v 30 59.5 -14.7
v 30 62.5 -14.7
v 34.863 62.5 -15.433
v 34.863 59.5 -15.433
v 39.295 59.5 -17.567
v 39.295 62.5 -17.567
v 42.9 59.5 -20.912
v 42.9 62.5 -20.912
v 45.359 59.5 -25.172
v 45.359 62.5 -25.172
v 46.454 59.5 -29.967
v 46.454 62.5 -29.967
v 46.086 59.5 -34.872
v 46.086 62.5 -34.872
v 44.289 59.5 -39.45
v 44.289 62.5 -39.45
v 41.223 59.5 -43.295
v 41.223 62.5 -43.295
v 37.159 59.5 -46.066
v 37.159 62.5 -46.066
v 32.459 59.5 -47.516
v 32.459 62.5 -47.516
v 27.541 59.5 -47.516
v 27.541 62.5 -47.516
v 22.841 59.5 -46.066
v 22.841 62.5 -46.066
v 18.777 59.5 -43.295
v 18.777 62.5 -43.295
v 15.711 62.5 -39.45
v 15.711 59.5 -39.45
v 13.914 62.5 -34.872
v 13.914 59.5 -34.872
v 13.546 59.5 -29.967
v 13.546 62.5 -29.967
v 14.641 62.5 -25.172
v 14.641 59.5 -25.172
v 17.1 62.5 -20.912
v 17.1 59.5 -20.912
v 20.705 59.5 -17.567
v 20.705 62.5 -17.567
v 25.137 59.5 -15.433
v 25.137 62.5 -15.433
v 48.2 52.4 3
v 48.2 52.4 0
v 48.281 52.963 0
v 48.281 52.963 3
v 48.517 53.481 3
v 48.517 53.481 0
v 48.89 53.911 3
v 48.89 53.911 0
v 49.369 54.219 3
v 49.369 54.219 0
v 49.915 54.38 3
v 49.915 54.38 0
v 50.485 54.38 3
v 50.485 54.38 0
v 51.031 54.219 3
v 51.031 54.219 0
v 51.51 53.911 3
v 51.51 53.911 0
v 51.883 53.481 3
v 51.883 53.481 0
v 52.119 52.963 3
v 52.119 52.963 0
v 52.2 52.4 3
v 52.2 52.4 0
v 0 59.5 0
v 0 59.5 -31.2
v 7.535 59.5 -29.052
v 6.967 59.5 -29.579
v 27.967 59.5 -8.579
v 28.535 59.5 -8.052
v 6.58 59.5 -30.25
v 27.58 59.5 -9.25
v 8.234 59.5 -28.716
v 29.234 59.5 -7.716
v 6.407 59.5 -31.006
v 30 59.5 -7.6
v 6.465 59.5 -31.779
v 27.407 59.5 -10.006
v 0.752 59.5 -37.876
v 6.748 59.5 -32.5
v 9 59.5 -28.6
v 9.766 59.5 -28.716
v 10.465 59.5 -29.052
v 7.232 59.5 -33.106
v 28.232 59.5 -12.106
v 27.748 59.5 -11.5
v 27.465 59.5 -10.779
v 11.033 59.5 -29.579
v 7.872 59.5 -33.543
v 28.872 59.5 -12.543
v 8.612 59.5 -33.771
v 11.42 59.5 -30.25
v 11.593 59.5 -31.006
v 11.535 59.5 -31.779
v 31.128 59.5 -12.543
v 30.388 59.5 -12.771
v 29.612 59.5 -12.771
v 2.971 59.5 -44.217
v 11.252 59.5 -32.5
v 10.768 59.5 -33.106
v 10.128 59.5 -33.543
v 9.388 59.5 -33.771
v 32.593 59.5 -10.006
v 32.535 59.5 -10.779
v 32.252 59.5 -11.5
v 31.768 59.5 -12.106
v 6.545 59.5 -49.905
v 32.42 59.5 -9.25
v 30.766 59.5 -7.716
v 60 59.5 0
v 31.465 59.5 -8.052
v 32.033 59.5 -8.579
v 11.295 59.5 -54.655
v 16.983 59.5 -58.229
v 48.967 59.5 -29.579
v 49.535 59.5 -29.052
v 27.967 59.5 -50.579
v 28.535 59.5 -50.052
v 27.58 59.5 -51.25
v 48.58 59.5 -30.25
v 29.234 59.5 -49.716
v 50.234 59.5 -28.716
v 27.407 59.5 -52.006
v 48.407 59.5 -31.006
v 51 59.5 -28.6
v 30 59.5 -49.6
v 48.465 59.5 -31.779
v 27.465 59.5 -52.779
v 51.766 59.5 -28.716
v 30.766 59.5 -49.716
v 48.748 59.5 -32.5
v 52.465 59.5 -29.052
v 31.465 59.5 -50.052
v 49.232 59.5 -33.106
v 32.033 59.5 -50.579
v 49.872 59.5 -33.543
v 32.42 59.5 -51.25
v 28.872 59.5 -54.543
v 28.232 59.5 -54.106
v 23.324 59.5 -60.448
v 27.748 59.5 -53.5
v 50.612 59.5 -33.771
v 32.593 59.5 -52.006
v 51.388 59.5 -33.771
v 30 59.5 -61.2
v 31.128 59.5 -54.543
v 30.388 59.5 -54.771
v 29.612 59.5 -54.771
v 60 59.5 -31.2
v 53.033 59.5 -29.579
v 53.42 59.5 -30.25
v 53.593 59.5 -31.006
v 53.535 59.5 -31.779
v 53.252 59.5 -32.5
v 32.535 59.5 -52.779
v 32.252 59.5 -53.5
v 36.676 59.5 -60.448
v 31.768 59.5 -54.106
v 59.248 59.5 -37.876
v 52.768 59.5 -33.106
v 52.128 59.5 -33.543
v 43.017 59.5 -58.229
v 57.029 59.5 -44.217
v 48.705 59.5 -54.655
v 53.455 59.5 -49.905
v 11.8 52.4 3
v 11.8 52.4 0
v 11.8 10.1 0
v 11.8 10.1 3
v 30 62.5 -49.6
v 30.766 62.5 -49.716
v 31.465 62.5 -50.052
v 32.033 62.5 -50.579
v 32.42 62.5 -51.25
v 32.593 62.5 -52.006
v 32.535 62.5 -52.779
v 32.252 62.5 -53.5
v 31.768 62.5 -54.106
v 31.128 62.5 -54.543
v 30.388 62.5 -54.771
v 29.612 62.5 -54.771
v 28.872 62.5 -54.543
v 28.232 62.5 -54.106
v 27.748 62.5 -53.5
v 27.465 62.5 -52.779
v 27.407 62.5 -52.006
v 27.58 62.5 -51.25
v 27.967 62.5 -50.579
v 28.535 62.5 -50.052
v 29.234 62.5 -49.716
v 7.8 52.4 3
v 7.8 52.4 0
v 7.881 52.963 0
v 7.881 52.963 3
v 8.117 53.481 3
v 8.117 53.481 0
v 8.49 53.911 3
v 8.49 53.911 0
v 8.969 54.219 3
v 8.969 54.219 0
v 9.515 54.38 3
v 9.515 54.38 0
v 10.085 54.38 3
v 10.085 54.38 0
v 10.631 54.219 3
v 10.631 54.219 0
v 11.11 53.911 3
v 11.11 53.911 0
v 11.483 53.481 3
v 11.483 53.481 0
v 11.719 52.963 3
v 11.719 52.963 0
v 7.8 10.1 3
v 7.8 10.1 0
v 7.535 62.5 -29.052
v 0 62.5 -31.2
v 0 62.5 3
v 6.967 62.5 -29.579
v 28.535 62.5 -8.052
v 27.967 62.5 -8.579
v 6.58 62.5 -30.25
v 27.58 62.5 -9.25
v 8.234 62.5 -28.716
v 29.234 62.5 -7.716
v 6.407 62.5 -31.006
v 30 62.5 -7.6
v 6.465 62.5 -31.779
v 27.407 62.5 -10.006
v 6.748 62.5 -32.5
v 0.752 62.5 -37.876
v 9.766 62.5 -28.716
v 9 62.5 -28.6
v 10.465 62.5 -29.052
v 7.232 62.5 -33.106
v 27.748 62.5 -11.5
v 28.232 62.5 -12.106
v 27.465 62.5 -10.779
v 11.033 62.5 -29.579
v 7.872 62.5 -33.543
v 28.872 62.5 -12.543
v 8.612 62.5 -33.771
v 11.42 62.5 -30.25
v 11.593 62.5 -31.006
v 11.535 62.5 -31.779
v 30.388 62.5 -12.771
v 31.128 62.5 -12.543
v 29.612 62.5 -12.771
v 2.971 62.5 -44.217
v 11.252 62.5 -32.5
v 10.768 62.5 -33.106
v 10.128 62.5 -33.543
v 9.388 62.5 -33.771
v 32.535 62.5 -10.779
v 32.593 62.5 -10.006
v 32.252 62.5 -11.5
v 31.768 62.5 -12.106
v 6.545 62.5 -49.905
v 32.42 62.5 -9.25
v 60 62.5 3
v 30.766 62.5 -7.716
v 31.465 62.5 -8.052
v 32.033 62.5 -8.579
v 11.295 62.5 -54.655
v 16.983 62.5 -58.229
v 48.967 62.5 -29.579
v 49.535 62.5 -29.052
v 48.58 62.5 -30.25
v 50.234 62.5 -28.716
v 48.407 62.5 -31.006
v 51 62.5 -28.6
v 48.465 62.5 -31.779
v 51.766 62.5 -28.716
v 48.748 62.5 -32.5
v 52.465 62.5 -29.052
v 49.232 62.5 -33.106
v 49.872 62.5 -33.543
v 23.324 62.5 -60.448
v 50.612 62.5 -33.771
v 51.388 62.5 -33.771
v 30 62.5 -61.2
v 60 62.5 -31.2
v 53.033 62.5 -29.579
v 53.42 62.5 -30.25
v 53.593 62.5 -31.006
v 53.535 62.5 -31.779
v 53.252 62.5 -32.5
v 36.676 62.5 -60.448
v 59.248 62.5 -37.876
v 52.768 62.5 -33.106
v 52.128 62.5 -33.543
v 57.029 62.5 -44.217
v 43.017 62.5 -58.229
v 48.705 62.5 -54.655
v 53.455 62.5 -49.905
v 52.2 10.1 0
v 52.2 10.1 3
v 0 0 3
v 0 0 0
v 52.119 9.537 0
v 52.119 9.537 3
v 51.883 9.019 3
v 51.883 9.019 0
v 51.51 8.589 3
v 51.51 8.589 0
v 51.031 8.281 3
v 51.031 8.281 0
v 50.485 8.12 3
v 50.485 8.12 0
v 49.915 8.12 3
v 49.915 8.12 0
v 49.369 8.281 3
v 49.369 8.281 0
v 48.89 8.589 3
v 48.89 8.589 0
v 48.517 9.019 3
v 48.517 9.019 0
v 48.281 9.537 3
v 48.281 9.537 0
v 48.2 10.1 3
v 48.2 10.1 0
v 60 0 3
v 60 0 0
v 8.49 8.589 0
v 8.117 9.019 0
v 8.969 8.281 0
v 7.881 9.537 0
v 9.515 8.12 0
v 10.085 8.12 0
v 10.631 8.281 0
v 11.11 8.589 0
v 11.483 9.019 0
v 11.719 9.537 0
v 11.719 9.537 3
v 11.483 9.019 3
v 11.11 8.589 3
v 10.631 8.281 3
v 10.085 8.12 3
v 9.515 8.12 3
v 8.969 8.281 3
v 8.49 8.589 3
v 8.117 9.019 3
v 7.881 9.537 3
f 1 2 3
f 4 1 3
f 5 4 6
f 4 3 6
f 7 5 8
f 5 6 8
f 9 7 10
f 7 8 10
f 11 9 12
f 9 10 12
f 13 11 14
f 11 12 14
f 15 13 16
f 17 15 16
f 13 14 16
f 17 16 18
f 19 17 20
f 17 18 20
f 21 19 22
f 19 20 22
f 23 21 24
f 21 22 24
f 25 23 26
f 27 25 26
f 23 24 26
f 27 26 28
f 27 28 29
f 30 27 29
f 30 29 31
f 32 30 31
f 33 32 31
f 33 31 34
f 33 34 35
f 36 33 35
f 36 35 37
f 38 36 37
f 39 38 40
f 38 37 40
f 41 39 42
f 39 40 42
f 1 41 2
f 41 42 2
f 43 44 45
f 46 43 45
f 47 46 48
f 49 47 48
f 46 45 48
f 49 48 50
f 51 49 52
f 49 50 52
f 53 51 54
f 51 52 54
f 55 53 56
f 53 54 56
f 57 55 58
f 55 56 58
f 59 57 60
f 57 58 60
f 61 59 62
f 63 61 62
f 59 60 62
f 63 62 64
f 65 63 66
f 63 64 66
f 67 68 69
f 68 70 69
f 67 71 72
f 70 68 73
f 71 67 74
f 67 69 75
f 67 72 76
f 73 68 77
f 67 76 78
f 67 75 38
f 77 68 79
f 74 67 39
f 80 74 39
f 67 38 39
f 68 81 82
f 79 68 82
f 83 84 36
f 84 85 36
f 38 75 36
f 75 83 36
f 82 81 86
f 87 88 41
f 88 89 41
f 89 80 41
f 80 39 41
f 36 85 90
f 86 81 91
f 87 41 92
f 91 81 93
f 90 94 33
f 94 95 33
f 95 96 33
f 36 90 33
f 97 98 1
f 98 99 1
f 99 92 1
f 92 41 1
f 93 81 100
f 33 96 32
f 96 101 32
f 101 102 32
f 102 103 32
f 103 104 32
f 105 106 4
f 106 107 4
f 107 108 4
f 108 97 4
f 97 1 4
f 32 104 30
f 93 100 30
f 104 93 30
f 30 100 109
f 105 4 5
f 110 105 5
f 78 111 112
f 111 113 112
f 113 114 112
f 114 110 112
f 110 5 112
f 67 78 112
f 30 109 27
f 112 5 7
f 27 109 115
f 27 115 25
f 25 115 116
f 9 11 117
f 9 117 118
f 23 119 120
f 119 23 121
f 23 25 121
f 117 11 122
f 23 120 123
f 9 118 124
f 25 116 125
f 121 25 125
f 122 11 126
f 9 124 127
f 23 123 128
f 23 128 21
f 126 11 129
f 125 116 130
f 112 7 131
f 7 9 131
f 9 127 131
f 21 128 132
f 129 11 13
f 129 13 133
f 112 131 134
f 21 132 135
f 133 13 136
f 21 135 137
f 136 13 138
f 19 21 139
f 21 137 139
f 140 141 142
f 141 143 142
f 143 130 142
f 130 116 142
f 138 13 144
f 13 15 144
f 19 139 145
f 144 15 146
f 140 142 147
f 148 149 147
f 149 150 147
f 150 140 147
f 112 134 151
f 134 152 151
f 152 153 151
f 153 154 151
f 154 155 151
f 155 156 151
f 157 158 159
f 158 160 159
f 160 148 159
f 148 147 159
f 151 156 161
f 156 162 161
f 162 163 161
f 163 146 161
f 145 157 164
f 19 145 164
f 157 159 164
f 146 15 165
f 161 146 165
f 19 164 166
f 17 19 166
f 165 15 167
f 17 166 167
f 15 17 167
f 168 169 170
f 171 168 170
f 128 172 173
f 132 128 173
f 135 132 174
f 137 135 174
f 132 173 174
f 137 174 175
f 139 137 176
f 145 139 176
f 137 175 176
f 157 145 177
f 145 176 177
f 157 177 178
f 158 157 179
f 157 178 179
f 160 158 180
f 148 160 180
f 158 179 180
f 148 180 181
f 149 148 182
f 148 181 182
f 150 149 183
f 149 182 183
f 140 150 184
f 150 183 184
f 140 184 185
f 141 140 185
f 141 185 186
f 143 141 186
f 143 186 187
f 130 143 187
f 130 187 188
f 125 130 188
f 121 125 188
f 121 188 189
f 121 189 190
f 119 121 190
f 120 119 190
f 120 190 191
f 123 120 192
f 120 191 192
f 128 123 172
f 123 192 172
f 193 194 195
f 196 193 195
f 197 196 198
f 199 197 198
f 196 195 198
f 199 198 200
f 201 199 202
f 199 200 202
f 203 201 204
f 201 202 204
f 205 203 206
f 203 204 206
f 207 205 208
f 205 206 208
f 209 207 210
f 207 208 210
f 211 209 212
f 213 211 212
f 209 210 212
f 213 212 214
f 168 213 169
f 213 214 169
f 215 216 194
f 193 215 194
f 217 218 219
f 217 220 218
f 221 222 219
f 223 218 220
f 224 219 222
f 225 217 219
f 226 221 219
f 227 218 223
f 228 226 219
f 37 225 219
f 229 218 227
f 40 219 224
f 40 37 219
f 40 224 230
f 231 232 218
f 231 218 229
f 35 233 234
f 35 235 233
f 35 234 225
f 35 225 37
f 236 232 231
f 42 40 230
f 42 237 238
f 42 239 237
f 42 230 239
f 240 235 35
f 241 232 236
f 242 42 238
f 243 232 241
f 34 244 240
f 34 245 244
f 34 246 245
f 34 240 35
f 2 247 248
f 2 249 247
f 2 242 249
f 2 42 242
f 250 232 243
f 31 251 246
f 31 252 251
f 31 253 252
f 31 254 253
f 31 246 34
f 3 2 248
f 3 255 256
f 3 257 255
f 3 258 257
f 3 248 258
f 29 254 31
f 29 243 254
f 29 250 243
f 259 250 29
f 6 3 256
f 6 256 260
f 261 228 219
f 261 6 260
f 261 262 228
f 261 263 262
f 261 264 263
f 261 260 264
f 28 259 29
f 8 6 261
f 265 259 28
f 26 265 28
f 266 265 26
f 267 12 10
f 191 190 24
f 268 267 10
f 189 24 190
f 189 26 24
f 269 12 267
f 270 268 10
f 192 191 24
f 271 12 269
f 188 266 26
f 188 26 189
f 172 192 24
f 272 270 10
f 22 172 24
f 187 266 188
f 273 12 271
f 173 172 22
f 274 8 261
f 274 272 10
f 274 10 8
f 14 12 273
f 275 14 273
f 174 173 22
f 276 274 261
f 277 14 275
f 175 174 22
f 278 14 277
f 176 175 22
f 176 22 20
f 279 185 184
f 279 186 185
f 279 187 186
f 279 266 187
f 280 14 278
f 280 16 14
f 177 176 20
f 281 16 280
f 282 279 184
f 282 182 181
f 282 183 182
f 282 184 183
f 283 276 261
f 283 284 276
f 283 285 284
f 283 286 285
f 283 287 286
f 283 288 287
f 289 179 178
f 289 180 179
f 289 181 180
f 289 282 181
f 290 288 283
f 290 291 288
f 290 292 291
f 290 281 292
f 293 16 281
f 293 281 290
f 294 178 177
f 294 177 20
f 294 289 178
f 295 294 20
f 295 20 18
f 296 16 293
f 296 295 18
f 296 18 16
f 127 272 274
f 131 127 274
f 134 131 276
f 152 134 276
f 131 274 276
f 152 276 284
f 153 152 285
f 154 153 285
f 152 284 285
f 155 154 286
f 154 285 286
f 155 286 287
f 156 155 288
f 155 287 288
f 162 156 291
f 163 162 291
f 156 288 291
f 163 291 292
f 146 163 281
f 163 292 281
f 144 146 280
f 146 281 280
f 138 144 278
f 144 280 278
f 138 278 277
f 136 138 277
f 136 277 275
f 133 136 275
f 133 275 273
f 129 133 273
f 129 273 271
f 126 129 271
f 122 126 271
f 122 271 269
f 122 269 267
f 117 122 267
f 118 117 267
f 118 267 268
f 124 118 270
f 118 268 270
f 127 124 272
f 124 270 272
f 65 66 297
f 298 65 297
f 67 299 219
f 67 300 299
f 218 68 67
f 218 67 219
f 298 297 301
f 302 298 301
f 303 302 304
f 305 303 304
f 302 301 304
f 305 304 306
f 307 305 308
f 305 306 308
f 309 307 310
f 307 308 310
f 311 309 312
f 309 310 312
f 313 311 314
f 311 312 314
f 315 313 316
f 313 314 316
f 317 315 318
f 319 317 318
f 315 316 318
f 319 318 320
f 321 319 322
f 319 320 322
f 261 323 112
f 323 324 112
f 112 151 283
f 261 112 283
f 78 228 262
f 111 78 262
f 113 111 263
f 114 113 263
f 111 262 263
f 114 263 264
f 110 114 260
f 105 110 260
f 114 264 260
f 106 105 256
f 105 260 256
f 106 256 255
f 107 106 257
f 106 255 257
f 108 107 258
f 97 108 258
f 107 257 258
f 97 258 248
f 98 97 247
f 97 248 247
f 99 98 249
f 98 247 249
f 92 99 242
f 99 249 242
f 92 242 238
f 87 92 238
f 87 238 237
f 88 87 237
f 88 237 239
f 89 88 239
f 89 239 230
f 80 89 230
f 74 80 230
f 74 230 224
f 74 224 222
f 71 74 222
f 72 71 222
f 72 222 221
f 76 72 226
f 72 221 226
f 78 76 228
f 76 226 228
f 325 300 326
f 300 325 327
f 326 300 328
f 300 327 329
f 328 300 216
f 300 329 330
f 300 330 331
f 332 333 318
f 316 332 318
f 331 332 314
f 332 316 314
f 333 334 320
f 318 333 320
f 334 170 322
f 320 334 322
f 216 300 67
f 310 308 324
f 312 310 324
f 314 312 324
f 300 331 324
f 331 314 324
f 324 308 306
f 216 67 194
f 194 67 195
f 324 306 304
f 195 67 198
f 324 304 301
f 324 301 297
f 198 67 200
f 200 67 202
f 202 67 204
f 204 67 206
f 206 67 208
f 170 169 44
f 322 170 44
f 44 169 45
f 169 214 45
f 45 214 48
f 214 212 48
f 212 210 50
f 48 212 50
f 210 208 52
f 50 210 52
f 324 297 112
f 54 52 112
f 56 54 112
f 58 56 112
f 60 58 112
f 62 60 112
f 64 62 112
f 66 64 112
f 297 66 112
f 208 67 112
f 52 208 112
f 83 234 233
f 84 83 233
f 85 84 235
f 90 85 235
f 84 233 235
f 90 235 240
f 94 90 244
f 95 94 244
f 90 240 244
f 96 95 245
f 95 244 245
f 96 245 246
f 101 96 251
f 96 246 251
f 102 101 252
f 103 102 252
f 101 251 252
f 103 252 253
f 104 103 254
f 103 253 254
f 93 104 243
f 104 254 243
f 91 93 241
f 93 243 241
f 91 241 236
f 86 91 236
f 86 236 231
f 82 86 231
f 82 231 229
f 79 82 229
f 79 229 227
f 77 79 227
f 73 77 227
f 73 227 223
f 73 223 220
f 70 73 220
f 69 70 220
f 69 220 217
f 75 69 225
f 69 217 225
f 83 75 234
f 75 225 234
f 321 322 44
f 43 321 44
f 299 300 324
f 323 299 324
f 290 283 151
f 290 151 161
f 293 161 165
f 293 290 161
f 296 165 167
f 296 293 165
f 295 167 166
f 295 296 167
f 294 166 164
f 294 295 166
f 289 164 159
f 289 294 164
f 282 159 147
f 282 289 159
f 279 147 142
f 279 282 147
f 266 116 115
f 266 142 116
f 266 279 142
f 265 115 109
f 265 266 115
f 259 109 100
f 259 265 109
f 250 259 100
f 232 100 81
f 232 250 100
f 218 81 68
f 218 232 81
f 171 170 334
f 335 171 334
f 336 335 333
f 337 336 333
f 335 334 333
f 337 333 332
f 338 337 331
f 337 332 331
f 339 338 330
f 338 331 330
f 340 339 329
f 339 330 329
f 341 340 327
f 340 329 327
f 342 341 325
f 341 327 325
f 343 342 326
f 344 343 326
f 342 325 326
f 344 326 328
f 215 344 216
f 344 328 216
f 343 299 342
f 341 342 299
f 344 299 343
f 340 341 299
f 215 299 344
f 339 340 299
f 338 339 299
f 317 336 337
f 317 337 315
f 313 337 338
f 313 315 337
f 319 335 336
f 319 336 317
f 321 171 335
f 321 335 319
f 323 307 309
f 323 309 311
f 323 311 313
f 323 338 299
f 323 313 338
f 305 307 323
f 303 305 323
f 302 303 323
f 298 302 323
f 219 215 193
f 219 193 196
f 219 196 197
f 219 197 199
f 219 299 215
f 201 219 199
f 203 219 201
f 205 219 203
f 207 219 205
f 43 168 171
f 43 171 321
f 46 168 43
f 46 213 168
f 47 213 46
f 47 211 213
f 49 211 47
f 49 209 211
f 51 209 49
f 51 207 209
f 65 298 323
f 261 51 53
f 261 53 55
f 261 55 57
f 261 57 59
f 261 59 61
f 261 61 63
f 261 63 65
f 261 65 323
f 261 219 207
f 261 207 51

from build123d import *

# Parameters (mm, degrees)
SKETCH1_W           = 60
SKETCH1_H           = 62.5
BOSS_EXTRUDE1_DEPTH = 3
SKETCH2_W           = 60
SKETCH2_H           = 64.2
BOSS_EXTRUDE2_DEPTH = 3
FILLET1_RADIUS      = 30
FILLET1_LENGTH      = 3
SKETCH3_R           = 16.5
SKETCH3_R_2         = 2.6
CUT_EXTRUDE1_DEPTH  = 3


with BuildPart() as part:
    # Sketch1 → Boss-Extrude1 (new body)
    with BuildSketch(Plane.XY):
        with Locations((30, 31.25)):
            Rectangle(SKETCH1_W, SKETCH1_H)
        with BuildLine():
            Line((7.8, 10.1), (7.8, 52.4))
            ThreePointArc((7.8, 52.4), (9.8, 54.4), (11.8, 52.4))
            Line((11.8, 52.4), (11.8, 10.1))
            ThreePointArc((11.8, 10.1), (9.8, 8.1), (7.8, 10.1))
        make_face(mode=Mode.SUBTRACT)
        with BuildLine():
            Line((48.2, 10.1), (48.2, 52.4))
            ThreePointArc((48.2, 52.4), (50.2, 54.4), (52.2, 52.4))
            Line((52.2, 52.4), (52.2, 10.1))
            ThreePointArc((52.2, 10.1), (50.2, 8.1), (48.2, 10.1))
        make_face(mode=Mode.SUBTRACT)
    extrude(amount=BOSS_EXTRUDE1_DEPTH)

    # Sketch2 → Boss-Extrude2 (add)
    with BuildSketch(Plane(origin=(0, 62.5, 0), x_dir=(1, 0, 0), z_dir=(0, 1, 0))):
        with Locations((30, 29.1)):
            Rectangle(SKETCH2_W, SKETCH2_H)
    extrude(amount=-BOSS_EXTRUDE2_DEPTH)

    # Fillet1: full round fillet: the end face becomes a half cylinder, R = half its width
    fillet1_face = Plane((30, 61, -61.2), x_dir=(0, 1, 0), z_dir=(0, 0, -1))  # on the end face: x along it, z out of the body
    fillet1_slab = fillet1_face.offset(-FILLET1_RADIUS / 2) * Box(FILLET1_LENGTH, 2 * FILLET1_RADIUS, FILLET1_RADIUS, mode=Mode.PRIVATE)  # the body's end, R deep
    fillet1_round = Plane((30, 61, -31.2), x_dir=(0, 0, -1), z_dir=(0, 1, 0)) * Cylinder(FILLET1_RADIUS, FILLET1_LENGTH, mode=Mode.PRIVATE)  # its axis R under the face
    add(fillet1_slab - fillet1_round, mode=Mode.SUBTRACT)

    # Sketch3 → Cut-Extrude1 (cut)
    with BuildSketch(Plane(origin=(0, 62.5, 0), x_dir=(1, 0, 0), z_dir=(0, 1, 0))):
        with Locations(Location((30, 31.2, 0), (0, 0, 270))):
            Circle(SKETCH3_R)
        with Locations(Location((30, 52.2, 0), (0, 0, 270))):
            Circle(SKETCH3_R_2)
        with Locations(Location((51, 31.2, 0), (0, 0, 270))):
            Circle(SKETCH3_R_2)
        with Locations(Location((30, 10.2, 0), (0, 0, 270))):
            Circle(SKETCH3_R_2)
        with Locations(Location((9, 31.2, 0), (0, 0, 270))):
            Circle(SKETCH3_R_2)
    extrude(amount=-CUT_EXTRUDE1_DEPTH, mode=Mode.SUBTRACT)


solid = part.part
